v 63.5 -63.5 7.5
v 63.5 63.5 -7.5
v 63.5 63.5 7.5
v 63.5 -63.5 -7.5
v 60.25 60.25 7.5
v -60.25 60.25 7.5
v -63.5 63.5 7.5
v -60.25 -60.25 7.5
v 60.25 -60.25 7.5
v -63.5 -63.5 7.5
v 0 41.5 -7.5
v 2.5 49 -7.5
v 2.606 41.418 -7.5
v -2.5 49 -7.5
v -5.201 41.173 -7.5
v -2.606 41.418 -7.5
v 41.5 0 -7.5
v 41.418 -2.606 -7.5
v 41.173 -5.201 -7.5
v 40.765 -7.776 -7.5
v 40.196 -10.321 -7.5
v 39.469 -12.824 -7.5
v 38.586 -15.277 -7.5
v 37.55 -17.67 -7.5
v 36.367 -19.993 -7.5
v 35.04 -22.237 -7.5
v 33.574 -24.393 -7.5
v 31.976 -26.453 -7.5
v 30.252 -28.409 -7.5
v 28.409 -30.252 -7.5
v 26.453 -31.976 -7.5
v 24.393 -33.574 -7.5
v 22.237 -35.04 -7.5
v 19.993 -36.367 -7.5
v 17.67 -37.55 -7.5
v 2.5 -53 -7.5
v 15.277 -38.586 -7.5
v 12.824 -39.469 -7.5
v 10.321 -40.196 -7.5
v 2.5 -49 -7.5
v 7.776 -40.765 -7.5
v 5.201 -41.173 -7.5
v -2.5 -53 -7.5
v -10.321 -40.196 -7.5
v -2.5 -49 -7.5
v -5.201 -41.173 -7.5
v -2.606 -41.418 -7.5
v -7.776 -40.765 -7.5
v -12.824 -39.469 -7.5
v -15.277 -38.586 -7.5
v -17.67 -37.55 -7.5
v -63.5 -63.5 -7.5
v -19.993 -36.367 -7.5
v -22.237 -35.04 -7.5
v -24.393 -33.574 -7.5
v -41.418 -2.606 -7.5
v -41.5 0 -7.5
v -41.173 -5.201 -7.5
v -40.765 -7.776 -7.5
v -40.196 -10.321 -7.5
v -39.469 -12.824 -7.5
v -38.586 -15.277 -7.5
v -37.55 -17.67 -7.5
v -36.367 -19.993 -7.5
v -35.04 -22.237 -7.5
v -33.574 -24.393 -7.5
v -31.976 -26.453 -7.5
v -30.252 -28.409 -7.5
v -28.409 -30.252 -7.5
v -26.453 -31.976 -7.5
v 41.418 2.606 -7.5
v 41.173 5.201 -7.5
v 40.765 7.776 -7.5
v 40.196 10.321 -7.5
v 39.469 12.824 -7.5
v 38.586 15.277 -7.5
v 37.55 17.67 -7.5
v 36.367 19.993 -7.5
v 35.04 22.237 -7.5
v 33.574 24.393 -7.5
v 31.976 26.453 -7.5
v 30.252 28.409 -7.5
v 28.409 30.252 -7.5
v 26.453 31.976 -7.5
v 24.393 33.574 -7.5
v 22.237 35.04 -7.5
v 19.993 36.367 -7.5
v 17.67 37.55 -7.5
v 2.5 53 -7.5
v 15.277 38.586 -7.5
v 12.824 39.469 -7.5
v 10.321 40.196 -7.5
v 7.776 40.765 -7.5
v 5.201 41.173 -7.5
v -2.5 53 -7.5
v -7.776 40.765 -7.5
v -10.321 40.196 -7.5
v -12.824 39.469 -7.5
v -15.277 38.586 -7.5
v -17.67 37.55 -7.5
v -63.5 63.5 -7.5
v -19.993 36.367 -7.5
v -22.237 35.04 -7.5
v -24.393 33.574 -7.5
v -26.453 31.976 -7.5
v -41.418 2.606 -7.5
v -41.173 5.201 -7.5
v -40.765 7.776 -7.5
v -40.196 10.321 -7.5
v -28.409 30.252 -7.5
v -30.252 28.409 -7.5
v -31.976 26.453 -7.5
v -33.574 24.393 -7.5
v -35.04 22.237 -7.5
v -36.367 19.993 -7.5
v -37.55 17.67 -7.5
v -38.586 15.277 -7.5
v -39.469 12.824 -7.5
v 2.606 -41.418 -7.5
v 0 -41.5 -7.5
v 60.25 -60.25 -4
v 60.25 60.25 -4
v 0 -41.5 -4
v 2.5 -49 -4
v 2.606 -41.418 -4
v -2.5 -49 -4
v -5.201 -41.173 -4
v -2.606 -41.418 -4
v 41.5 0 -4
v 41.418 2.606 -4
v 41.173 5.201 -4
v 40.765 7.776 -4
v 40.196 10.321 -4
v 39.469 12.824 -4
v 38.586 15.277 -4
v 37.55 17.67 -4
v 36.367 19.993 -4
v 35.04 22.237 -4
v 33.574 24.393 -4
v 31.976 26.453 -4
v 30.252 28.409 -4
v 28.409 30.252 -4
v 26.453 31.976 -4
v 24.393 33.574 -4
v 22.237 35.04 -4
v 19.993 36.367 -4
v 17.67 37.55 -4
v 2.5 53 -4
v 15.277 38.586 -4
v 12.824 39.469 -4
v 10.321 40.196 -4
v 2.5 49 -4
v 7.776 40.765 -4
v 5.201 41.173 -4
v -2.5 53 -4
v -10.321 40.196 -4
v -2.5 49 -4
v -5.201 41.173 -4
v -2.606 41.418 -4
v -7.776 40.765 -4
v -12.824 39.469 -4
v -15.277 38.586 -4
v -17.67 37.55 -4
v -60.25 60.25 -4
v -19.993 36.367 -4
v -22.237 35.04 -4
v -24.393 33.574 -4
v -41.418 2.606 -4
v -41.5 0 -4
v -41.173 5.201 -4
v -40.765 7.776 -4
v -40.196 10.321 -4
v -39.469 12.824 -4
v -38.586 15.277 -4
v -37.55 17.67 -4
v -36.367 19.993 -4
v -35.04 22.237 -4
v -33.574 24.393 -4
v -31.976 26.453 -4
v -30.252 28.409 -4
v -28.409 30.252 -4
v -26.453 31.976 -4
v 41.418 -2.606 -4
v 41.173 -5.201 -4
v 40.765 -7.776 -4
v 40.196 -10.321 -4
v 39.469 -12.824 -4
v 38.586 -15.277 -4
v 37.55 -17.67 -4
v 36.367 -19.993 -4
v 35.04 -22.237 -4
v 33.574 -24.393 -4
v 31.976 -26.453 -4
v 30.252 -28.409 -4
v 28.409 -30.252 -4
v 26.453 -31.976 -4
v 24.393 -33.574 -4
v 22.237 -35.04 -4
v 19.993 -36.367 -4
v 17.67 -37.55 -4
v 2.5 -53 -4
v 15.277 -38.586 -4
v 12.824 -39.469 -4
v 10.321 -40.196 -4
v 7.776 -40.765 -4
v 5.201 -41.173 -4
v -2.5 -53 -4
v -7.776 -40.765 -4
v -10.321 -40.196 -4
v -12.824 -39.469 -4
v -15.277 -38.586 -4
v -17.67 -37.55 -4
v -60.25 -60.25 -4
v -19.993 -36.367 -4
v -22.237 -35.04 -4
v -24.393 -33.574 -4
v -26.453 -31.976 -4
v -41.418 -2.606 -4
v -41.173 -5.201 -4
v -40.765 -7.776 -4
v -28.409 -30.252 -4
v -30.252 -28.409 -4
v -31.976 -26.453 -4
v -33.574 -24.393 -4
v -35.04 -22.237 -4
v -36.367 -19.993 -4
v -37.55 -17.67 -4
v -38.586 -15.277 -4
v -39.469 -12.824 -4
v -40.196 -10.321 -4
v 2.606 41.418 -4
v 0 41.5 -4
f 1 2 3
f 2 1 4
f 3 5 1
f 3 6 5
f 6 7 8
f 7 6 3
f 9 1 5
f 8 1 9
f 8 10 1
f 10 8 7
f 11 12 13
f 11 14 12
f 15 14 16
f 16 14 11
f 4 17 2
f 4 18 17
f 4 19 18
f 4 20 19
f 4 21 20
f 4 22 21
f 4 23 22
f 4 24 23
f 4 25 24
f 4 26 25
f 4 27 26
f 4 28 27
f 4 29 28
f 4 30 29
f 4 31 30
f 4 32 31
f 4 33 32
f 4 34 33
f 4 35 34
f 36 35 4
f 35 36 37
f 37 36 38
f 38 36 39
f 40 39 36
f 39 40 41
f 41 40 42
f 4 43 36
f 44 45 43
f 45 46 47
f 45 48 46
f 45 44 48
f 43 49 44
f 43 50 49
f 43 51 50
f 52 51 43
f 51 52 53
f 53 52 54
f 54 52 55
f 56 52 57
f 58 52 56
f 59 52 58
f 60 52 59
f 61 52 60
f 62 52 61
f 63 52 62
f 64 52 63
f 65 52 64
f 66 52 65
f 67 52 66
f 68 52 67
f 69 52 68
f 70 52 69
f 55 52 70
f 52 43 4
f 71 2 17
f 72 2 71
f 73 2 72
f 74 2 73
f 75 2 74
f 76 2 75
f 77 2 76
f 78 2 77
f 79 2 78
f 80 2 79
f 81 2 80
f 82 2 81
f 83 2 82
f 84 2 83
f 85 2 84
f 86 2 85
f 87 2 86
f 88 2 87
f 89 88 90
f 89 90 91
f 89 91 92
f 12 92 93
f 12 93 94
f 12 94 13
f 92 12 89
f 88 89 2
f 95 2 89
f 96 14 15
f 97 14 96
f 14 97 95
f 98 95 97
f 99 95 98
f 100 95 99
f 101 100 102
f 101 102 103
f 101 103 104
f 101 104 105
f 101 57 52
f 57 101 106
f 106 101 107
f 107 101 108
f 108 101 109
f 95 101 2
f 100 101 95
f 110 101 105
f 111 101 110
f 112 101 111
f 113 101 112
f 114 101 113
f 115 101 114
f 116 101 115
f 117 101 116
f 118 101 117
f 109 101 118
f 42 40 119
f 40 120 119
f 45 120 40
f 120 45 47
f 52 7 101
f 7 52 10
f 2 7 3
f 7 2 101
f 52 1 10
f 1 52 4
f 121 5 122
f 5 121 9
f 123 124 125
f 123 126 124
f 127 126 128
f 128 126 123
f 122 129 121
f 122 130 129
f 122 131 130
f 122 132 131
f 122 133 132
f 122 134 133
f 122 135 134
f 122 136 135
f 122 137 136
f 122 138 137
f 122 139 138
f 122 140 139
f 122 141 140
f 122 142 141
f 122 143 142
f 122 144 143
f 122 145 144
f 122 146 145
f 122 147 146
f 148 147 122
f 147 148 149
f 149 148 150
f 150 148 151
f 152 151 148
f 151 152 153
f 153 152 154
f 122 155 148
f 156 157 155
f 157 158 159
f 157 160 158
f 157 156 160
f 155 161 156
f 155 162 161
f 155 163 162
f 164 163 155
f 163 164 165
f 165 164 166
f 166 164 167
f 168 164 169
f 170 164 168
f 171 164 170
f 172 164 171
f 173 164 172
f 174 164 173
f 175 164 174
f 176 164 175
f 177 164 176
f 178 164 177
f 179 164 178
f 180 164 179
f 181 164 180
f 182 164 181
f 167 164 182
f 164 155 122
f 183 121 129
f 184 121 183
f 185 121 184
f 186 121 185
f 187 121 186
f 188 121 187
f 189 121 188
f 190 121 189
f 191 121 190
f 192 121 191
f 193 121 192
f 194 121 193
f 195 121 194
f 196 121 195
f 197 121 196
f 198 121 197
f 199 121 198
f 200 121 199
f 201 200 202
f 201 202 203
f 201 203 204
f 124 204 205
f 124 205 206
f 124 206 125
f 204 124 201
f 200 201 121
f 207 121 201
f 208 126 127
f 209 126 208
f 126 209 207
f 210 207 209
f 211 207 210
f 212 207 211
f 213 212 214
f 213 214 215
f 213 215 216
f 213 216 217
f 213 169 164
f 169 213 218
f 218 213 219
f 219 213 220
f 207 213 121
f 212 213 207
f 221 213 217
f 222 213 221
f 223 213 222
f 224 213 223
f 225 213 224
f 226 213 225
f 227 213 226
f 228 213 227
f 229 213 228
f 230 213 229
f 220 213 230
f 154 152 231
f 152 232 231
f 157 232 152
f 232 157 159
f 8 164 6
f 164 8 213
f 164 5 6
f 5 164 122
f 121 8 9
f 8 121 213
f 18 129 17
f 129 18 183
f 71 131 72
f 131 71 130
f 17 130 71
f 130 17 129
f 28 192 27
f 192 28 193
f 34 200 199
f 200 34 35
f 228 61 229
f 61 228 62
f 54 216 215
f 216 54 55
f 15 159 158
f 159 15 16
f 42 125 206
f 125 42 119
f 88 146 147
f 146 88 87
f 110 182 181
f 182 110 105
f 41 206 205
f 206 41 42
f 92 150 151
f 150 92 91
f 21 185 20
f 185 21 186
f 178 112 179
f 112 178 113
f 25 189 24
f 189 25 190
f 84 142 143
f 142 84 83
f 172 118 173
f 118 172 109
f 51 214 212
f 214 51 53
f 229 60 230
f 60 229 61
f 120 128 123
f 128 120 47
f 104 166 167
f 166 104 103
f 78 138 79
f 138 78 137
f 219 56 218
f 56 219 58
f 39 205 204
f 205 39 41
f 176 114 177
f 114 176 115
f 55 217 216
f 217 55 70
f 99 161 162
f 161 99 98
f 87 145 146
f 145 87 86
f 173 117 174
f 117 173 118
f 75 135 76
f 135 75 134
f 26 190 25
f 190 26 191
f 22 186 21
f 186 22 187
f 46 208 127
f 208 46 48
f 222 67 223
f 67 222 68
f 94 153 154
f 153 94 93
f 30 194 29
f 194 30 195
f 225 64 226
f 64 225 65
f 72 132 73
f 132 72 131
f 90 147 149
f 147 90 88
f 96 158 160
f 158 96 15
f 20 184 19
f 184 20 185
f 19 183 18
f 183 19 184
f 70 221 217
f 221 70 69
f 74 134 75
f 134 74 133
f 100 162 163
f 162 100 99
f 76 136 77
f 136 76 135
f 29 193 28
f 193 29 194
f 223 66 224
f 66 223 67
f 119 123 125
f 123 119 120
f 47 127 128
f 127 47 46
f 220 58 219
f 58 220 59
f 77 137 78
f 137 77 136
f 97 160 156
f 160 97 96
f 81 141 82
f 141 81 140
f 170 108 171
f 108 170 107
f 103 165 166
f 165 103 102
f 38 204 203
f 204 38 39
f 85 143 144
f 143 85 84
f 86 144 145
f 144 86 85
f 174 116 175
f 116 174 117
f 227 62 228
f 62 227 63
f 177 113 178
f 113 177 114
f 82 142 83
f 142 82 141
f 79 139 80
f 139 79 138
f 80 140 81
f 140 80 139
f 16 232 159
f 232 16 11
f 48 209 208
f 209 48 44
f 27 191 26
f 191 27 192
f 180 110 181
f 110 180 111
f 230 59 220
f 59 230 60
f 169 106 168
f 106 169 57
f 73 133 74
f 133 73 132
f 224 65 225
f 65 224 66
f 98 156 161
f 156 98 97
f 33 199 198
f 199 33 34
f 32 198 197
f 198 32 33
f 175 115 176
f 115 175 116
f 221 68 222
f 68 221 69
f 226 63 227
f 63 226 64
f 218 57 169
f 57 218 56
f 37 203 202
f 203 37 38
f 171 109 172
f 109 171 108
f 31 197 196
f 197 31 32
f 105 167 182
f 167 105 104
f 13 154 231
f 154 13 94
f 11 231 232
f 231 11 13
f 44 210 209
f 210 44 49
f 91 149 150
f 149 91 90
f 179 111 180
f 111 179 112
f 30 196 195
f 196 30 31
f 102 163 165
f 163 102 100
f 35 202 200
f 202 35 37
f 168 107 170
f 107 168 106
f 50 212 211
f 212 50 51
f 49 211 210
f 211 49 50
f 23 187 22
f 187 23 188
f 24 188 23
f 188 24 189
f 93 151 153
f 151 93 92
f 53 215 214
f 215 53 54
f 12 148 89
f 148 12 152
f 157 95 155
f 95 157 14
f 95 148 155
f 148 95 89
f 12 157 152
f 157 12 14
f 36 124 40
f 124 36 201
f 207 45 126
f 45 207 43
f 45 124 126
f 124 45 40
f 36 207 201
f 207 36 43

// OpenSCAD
// WASABI Niko FDM Printer
// Board cover
// GNU GPL v3
// SANTA no Mix
// https://ameblo.jp/math-physics/theme-10117154956.html
// https://github.com/SantaNoMix/
$fn = 100;
difference () {
    cube ([127,127,15],center = true);
    translate ([0,0,2]) {
        cube ([120.5,120.5,12],center = true);
    }
    cylinder (20,41.5,41.5,center = true);
    translate ([0,51,0]) {
        cube ([5,4,20],center = true);
    }
    translate ([0,-51,0]) {
        cube ([5,4,20],center = true);
    }
}
